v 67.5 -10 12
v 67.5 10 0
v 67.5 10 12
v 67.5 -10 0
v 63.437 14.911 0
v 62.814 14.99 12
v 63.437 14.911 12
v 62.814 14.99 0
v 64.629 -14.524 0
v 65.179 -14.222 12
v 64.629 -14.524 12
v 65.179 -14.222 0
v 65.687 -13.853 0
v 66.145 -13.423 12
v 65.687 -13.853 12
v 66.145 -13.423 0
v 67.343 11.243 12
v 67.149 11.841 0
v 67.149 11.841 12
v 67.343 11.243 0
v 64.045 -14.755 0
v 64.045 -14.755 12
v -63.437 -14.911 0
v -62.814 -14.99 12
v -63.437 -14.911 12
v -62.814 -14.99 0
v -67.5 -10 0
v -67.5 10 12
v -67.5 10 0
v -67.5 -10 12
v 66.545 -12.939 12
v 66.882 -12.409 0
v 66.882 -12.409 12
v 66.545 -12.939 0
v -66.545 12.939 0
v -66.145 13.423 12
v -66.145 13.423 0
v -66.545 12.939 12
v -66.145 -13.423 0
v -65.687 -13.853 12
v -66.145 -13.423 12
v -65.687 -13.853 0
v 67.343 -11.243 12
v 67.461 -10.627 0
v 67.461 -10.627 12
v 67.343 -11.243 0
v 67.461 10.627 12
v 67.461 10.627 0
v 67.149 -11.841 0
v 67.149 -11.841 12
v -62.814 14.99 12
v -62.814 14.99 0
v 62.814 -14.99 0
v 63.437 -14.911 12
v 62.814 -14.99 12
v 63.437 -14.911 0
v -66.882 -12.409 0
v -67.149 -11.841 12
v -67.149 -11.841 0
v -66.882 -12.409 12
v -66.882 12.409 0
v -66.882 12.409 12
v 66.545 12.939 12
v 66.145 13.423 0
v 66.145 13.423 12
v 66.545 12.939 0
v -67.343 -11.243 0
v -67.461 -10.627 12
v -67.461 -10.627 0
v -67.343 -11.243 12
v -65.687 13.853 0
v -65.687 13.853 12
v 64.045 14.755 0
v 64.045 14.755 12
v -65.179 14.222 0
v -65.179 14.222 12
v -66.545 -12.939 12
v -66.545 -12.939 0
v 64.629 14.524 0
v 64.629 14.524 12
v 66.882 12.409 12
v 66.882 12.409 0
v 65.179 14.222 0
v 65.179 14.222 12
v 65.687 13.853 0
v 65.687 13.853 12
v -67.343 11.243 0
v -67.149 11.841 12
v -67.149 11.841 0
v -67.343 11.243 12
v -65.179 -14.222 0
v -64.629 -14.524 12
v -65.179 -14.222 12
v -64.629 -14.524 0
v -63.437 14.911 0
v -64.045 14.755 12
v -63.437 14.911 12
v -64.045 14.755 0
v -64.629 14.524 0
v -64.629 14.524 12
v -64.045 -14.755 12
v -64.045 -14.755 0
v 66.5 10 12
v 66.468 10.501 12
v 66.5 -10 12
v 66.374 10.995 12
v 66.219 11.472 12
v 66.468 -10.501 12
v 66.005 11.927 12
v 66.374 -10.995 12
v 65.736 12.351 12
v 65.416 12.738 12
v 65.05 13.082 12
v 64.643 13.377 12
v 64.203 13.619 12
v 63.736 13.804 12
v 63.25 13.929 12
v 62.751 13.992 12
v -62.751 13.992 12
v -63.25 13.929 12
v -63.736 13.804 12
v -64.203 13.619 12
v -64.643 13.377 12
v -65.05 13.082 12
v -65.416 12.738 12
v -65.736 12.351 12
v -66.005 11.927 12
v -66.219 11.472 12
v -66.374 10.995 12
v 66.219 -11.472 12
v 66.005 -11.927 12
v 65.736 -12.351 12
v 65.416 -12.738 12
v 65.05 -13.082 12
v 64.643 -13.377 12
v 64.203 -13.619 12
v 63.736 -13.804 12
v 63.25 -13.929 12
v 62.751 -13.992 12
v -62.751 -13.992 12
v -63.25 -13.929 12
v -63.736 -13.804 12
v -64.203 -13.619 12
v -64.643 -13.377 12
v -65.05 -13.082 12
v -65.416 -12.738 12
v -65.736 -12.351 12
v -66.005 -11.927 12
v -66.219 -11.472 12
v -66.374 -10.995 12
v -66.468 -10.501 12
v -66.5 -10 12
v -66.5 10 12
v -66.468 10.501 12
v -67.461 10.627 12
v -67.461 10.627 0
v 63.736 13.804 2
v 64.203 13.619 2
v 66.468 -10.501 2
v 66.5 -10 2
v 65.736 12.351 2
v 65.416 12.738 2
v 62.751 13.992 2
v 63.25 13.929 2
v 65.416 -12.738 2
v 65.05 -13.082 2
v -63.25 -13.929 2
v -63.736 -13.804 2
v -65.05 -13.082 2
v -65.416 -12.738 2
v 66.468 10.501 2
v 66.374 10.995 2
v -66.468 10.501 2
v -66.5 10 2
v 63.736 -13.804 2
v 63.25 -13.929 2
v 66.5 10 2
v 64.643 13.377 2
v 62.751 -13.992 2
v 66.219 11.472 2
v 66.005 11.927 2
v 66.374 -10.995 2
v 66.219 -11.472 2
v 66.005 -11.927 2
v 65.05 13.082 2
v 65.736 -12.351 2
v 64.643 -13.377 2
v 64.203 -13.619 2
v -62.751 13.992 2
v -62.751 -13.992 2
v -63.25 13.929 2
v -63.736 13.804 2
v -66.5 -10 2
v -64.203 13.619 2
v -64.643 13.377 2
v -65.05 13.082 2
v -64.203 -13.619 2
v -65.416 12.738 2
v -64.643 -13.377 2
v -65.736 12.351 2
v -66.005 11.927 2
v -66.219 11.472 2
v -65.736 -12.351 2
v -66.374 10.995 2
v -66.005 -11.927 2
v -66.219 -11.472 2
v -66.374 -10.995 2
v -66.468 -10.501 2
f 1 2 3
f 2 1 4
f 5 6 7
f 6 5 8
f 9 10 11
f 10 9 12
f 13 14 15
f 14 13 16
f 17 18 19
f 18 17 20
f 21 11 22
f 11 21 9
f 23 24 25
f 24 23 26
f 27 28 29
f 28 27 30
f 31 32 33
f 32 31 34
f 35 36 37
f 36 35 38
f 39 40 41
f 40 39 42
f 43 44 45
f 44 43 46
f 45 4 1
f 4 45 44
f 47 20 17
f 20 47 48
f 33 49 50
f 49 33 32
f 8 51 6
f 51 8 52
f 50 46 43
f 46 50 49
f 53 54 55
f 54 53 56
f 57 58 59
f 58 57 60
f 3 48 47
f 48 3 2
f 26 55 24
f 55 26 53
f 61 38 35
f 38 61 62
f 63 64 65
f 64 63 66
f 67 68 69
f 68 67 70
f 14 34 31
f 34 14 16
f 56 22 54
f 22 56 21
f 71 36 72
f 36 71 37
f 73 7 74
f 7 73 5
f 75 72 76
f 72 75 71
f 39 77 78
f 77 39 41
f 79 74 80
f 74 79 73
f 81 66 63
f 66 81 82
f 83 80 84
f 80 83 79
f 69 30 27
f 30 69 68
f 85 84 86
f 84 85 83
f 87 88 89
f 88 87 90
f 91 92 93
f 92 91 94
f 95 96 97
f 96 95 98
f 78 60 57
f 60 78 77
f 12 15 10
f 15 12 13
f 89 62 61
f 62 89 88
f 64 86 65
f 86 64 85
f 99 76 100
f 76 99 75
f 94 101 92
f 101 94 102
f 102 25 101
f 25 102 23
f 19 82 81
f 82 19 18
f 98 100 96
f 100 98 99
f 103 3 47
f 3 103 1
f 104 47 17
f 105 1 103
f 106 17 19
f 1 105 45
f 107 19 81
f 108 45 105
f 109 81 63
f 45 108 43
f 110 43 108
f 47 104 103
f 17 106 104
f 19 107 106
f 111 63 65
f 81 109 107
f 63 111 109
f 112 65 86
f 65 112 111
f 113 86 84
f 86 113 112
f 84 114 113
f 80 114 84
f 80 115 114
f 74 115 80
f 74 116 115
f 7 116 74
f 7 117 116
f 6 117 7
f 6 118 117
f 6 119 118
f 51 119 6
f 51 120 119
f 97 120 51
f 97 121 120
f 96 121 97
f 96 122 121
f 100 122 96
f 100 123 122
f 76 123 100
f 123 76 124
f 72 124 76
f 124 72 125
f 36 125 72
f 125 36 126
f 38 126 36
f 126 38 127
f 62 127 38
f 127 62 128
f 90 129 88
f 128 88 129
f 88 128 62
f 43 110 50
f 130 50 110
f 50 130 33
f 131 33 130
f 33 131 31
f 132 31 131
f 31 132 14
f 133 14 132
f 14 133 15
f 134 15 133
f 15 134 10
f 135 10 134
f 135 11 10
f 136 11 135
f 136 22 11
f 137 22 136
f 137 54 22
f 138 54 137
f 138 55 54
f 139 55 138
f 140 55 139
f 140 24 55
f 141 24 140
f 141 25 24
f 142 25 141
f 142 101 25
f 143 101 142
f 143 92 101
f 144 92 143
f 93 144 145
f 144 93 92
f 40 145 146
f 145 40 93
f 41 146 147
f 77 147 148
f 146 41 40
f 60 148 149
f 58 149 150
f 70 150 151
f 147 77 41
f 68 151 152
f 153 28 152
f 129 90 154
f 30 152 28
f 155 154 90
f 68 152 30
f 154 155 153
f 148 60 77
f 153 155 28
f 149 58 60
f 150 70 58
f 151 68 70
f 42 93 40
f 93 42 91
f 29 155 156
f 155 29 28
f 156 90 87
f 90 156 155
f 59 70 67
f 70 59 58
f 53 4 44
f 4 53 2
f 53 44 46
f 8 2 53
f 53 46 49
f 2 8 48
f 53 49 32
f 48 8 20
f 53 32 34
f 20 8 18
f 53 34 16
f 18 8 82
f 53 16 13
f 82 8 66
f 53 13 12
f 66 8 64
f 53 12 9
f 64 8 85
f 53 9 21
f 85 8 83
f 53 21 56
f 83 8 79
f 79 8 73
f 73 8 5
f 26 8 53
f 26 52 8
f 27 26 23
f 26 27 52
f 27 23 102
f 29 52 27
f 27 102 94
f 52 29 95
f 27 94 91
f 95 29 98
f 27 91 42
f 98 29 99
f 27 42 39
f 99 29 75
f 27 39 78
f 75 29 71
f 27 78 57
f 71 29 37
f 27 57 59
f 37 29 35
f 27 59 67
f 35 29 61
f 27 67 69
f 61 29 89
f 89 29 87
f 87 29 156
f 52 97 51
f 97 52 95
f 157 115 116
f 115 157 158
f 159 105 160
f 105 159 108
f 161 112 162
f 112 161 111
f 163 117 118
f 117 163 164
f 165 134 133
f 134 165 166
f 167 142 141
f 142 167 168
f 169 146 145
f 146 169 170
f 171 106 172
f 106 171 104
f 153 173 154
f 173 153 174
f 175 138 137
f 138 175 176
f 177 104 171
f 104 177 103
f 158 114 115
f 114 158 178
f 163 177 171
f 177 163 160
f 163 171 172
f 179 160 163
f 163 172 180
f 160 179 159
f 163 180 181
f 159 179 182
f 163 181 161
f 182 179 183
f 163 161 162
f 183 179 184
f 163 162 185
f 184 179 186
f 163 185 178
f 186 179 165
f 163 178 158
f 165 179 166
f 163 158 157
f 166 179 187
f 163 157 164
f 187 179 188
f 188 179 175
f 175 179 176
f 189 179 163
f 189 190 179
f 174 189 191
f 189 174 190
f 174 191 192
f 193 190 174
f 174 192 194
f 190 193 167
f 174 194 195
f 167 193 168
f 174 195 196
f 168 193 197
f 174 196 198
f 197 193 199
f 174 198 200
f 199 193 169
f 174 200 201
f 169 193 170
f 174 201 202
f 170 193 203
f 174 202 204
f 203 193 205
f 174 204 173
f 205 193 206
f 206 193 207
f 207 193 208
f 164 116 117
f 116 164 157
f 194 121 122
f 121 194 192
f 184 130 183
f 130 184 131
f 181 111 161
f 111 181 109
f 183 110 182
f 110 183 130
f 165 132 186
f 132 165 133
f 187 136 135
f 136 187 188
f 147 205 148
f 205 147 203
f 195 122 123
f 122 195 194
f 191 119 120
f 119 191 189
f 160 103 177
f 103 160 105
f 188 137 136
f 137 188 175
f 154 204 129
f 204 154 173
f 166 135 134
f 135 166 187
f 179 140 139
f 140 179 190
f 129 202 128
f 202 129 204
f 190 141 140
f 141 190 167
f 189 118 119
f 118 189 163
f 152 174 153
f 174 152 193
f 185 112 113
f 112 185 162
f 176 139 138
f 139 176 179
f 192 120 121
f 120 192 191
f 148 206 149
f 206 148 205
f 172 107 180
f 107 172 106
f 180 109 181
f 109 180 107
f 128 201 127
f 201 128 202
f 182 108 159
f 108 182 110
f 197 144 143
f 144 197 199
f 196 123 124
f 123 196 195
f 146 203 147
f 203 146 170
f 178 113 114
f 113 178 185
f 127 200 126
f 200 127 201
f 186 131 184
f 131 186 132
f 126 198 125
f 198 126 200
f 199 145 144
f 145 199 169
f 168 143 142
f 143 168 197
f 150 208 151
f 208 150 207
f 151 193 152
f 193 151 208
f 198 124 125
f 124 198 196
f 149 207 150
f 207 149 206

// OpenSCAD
$fn = 50;


difference() {
	union() {
		hull() {
			translate(v = [-62.5000000000, 10.0000000000, 0]) {
				cylinder(h = 12, r = 5);
			}
			translate(v = [62.5000000000, 10.0000000000, 0]) {
				cylinder(h = 12, r = 5);
			}
			translate(v = [-62.5000000000, -10.0000000000, 0]) {
				cylinder(h = 12, r = 5);
			}
			translate(v = [62.5000000000, -10.0000000000, 0]) {
				cylinder(h = 12, r = 5);
			}
		}
	}
	union() {
		translate(v = [0, 0, 2]) {
			hull() {
				translate(v = [-62.5000000000, 10.0000000000, 0]) {
					cylinder(h = 10, r = 4);
				}
				translate(v = [62.5000000000, 10.0000000000, 0]) {
					cylinder(h = 10, r = 4);
				}
				translate(v = [-62.5000000000, -10.0000000000, 0]) {
					cylinder(h = 10, r = 4);
				}
				translate(v = [62.5000000000, -10.0000000000, 0]) {
					cylinder(h = 10, r = 4);
				}
			}
		}
	}
}
